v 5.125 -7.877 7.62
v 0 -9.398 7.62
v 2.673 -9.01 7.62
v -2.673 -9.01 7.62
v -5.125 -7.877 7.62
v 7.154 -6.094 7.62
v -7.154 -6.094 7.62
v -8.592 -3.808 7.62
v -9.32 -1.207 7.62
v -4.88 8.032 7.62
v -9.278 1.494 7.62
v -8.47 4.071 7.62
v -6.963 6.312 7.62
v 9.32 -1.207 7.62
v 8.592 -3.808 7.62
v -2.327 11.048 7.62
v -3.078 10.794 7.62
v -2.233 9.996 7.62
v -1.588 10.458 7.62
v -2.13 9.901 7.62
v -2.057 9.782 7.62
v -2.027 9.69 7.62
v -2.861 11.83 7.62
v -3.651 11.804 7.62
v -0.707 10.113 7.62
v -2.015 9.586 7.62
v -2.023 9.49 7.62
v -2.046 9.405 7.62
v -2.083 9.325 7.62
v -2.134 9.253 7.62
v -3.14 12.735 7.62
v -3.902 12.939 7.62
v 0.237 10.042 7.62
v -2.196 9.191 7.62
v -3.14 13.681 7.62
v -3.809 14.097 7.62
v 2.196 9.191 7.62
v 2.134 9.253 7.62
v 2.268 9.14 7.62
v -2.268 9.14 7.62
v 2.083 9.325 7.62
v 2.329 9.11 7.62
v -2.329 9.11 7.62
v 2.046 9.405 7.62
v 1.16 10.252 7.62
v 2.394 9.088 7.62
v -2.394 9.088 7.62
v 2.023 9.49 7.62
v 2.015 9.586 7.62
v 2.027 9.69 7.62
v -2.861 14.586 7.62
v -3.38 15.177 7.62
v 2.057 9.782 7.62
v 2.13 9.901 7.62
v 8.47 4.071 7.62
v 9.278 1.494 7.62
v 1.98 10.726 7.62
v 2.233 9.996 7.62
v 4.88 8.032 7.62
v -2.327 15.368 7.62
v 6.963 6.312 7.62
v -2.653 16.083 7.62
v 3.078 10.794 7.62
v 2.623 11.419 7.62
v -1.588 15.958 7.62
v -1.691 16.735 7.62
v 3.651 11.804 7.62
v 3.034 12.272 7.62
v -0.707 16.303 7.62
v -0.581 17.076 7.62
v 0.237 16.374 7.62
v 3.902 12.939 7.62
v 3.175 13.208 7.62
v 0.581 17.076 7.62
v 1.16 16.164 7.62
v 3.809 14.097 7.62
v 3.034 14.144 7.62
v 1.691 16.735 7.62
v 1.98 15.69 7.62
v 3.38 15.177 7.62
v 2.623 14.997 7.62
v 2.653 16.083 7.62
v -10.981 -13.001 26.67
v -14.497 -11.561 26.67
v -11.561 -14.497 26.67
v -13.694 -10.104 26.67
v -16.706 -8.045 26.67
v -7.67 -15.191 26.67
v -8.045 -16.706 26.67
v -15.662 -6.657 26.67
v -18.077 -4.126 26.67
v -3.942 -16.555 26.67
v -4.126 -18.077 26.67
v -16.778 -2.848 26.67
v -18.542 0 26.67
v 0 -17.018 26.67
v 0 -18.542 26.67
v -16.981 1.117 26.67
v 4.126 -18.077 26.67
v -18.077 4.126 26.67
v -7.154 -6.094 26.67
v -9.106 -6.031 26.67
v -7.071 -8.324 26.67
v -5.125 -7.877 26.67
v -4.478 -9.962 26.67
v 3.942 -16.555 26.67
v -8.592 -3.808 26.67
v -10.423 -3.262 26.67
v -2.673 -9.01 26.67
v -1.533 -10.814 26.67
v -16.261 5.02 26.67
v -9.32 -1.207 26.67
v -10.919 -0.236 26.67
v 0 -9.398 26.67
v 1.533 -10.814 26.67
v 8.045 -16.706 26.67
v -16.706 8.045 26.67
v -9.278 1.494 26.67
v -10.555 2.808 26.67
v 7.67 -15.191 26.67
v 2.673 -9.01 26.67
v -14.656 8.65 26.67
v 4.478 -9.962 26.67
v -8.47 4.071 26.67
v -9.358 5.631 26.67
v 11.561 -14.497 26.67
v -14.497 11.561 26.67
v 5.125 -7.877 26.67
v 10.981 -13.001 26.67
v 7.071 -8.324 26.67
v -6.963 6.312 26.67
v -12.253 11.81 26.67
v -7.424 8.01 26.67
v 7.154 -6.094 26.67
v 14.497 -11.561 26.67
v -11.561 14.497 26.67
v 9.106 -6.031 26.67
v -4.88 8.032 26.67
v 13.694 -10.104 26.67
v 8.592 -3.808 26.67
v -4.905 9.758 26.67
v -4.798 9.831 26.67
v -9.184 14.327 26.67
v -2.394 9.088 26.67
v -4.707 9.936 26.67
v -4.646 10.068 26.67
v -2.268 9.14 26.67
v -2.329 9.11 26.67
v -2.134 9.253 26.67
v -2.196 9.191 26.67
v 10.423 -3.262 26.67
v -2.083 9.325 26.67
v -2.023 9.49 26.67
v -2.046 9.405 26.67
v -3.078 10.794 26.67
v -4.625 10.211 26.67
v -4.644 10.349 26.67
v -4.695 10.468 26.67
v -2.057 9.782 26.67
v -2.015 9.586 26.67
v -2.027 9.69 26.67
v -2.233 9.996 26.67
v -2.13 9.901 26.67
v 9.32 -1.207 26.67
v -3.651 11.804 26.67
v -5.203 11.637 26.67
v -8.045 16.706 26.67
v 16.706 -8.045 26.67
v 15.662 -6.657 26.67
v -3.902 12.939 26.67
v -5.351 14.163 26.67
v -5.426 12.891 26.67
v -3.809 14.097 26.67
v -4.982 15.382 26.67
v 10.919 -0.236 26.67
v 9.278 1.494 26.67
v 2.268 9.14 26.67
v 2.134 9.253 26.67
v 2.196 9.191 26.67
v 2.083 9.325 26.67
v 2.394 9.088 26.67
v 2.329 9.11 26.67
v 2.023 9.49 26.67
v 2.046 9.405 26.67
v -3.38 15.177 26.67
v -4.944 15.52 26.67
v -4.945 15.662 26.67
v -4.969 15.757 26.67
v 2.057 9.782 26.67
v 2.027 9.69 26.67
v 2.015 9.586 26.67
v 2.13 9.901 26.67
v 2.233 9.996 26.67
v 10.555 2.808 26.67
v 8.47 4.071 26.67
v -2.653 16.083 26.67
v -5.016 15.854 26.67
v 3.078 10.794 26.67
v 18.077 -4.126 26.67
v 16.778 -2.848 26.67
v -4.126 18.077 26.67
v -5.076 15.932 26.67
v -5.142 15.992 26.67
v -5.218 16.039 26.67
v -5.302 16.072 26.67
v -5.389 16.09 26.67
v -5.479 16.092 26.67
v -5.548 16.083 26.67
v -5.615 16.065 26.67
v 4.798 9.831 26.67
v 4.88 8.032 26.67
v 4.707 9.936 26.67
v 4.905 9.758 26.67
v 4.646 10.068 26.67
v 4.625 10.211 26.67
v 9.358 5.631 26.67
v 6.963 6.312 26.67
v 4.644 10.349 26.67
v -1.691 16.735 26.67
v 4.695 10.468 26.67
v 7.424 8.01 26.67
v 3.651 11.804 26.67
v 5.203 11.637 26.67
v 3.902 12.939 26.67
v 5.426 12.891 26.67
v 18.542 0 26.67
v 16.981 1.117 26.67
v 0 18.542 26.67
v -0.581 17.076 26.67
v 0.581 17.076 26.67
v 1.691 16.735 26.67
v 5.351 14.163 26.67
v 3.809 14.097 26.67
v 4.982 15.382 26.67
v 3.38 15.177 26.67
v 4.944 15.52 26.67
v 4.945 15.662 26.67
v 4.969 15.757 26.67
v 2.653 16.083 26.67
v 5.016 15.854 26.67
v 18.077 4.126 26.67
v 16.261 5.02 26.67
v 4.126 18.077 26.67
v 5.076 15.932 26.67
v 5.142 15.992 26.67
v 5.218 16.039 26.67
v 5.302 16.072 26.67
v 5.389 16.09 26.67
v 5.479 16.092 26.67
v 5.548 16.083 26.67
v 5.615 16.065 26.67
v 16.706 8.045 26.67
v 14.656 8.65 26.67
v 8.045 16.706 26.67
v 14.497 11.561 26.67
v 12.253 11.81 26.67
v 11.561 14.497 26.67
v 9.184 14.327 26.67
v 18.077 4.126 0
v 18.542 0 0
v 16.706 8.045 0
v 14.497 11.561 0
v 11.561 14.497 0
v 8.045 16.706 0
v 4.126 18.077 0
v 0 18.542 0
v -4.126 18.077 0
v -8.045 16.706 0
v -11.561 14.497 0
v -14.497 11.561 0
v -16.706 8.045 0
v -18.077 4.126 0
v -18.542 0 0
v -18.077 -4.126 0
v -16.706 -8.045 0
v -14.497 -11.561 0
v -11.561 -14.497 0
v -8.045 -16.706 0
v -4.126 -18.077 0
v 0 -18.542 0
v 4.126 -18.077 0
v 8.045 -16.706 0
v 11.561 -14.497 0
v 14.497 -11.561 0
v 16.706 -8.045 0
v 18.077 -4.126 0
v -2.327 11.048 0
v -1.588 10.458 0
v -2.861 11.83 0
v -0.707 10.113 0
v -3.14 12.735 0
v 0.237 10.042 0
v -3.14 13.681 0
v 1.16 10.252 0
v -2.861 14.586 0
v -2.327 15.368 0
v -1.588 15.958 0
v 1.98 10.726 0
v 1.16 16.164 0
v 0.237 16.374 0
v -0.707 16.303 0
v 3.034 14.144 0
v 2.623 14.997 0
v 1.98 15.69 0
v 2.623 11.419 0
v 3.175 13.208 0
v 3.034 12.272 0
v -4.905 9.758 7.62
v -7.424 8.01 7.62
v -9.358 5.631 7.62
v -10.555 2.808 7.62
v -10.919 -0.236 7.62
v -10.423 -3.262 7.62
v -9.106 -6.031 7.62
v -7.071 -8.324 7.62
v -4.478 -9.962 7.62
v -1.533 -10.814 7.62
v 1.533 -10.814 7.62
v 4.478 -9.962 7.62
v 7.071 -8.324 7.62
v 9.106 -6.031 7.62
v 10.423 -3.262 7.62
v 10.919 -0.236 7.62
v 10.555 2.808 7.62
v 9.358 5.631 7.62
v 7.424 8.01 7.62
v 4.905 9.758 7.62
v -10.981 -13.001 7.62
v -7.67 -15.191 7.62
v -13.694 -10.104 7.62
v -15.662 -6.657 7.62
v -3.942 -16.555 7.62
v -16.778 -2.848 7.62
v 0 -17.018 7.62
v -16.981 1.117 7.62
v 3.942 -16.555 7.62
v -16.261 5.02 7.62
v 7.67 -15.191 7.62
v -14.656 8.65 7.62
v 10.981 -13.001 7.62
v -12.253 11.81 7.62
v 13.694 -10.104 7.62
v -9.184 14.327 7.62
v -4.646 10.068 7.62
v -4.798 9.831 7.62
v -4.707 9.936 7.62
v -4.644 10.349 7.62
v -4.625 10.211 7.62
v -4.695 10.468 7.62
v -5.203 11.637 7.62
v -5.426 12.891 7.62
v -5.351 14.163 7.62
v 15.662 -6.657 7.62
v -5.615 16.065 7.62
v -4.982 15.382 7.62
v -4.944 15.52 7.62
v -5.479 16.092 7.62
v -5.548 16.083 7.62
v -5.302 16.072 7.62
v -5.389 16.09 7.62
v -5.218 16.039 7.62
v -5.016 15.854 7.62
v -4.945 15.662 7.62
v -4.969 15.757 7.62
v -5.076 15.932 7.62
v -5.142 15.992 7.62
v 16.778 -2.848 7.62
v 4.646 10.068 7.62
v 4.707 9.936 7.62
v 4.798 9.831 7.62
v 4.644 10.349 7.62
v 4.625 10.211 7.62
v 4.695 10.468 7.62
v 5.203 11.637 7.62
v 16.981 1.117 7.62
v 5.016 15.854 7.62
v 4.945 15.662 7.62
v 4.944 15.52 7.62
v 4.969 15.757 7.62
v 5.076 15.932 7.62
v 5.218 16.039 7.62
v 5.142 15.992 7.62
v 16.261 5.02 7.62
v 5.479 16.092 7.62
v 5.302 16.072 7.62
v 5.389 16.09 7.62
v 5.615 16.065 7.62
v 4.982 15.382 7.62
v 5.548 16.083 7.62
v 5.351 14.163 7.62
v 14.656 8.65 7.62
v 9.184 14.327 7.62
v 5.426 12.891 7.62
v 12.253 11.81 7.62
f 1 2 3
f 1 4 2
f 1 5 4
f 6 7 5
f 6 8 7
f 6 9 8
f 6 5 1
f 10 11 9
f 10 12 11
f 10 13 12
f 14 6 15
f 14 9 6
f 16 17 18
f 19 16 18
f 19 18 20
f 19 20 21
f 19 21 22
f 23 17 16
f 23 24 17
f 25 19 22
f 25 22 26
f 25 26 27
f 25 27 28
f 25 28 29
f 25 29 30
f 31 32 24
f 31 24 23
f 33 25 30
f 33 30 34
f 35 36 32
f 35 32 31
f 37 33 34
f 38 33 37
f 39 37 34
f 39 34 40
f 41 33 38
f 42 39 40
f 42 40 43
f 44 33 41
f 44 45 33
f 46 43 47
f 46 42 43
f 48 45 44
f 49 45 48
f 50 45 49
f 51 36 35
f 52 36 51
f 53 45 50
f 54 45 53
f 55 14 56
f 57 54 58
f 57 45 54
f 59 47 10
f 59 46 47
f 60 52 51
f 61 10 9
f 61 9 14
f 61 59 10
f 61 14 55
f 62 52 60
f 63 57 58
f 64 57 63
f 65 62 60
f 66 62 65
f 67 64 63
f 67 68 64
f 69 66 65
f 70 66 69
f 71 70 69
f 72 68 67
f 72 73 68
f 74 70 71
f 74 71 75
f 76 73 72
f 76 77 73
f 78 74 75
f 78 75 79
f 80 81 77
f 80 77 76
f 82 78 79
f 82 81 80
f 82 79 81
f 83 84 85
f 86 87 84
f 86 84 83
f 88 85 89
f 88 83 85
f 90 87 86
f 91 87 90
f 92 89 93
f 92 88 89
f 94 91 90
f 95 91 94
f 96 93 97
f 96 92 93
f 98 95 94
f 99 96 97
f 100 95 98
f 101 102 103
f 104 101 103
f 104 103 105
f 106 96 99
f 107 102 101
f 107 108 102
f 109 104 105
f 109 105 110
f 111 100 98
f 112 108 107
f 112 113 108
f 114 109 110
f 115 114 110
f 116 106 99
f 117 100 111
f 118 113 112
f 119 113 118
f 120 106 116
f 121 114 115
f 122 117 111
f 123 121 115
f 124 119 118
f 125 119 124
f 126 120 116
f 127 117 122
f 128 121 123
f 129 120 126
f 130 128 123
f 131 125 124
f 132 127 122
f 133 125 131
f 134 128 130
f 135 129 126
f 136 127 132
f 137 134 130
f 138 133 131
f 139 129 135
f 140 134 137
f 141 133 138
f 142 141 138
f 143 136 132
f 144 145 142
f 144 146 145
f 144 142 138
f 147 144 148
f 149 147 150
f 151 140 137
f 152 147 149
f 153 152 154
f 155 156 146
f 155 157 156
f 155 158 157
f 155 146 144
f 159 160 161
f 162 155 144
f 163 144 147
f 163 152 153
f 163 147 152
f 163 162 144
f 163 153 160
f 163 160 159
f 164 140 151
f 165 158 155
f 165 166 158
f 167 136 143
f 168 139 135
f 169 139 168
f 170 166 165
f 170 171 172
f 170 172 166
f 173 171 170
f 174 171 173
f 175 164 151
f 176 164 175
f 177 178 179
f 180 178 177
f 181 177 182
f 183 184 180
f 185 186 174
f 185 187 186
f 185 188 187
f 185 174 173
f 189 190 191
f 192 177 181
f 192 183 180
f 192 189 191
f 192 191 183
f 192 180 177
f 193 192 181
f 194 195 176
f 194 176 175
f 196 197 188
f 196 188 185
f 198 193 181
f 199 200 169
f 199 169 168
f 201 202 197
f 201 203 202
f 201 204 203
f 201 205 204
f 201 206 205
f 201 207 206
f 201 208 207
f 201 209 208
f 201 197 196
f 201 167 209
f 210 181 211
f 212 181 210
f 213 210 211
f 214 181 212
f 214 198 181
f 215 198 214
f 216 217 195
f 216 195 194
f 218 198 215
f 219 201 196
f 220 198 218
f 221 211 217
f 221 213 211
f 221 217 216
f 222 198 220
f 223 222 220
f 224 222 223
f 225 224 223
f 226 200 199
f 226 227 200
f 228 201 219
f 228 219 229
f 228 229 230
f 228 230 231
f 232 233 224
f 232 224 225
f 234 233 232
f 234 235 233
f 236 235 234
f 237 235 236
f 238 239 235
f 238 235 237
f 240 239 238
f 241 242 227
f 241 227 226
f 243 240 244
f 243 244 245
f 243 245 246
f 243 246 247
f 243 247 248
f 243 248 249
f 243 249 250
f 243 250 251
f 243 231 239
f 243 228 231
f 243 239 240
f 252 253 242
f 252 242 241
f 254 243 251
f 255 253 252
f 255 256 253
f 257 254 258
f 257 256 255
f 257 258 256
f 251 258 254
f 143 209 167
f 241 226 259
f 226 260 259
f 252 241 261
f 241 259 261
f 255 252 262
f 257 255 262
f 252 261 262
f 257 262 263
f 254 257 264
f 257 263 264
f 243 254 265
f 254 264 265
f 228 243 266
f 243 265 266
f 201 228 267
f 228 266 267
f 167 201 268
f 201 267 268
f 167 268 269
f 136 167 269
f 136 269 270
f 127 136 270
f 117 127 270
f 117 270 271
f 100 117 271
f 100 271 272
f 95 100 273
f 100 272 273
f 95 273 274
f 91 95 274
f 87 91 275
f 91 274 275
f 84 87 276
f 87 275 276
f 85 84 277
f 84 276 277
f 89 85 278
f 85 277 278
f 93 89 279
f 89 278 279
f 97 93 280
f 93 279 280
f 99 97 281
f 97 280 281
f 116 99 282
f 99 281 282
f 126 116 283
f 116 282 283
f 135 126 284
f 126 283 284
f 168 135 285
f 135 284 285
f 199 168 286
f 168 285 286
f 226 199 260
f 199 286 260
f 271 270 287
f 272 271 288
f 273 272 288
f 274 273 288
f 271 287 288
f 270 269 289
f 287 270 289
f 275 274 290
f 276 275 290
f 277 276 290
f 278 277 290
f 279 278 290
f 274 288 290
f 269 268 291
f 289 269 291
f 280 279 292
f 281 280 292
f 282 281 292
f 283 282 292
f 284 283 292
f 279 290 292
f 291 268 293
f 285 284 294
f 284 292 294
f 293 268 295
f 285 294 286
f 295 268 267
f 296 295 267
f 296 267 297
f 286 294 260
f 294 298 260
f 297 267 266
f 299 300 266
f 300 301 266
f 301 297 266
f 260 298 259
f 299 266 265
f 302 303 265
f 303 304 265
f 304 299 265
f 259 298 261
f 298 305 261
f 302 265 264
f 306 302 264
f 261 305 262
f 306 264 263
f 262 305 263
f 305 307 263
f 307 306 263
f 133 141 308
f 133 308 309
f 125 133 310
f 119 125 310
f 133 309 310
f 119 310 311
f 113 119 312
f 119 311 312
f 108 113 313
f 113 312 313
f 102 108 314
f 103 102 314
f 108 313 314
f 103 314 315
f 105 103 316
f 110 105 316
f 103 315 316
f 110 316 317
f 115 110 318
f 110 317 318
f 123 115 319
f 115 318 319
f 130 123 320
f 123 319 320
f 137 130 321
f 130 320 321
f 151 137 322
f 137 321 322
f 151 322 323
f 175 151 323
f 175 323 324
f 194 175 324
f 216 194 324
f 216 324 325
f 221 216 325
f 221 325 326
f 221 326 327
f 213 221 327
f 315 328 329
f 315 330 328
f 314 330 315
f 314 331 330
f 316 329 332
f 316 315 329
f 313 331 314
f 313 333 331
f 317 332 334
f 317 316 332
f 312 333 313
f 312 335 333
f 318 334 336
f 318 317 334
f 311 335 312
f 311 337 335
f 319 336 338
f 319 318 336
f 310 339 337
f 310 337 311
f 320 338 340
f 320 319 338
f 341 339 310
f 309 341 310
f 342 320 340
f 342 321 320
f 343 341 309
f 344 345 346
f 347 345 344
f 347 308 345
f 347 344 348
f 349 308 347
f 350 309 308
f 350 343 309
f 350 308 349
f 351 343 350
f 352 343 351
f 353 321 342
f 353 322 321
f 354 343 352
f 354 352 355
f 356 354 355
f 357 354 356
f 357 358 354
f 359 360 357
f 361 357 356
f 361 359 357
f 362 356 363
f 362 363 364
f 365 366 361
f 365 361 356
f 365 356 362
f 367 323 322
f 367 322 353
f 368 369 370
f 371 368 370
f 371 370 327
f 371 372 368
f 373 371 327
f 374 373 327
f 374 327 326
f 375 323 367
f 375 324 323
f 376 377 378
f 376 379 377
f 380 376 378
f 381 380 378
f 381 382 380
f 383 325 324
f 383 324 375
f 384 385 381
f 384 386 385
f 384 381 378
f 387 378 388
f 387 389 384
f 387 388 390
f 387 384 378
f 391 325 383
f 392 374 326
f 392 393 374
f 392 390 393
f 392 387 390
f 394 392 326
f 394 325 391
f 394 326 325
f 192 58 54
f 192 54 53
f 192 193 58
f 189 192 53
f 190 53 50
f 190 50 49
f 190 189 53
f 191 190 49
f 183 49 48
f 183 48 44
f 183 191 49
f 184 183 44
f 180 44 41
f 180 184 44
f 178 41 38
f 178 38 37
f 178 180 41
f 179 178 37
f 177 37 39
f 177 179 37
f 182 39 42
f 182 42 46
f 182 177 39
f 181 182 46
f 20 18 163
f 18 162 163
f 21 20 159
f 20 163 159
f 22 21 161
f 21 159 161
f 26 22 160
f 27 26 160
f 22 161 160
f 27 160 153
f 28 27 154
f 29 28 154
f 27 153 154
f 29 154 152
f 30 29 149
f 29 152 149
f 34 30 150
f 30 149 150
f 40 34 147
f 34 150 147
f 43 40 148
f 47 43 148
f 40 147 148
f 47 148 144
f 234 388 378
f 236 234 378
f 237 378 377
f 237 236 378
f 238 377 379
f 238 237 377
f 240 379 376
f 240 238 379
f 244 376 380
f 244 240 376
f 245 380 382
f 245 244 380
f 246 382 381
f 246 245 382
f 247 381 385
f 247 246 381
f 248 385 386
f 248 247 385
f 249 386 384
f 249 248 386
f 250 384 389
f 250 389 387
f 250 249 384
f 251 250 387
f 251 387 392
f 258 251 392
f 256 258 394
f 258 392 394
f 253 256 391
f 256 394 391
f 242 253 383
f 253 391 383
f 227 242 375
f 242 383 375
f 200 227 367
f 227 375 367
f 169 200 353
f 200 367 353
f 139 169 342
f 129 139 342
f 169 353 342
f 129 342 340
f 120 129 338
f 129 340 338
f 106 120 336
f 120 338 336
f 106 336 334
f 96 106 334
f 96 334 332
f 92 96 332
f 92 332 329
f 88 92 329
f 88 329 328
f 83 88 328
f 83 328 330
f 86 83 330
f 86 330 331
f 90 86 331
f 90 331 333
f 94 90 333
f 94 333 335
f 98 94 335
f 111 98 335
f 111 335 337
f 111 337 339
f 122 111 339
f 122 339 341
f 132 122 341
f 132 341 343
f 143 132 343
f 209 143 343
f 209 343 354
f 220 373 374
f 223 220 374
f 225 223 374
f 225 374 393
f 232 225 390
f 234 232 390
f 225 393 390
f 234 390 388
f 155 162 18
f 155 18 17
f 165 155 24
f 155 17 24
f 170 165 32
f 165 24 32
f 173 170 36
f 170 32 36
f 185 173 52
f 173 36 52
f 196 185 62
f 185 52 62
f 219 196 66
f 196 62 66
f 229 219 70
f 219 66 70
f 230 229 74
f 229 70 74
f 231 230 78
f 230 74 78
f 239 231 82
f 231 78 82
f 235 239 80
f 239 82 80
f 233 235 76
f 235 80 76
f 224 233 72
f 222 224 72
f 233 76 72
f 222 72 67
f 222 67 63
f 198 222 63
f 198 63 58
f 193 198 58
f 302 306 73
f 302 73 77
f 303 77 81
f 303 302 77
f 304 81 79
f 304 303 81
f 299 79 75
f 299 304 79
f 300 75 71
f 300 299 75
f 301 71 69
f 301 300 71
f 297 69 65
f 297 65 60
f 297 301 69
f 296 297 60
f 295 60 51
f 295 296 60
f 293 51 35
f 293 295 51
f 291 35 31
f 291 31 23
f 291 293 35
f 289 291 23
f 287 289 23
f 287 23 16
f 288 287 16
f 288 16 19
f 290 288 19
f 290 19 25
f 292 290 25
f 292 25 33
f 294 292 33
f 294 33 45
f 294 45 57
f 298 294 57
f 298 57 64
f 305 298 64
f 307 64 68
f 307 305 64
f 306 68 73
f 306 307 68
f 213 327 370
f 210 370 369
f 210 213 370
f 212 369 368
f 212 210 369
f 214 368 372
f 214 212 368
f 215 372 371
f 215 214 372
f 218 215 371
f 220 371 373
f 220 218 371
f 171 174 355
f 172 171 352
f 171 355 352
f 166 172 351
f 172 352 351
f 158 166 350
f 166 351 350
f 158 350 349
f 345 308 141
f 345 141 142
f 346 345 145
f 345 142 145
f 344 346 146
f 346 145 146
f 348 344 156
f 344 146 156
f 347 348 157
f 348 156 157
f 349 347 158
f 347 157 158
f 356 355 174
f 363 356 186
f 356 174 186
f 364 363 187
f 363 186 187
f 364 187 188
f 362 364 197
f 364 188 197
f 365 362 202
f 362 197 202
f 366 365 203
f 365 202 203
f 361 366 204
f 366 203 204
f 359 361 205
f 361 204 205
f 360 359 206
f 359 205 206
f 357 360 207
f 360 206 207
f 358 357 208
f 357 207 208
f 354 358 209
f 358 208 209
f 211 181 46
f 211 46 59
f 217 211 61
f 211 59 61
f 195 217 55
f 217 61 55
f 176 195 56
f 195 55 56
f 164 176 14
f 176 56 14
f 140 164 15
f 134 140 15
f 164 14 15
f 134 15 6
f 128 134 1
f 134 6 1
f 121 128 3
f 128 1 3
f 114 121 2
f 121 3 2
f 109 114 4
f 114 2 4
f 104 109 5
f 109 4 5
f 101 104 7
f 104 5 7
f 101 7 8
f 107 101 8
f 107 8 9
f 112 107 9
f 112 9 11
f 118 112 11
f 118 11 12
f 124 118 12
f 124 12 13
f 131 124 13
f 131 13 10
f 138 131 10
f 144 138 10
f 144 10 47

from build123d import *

# Parameters (mm, degrees)
F0_R     = 18.542
F0_R_2   = 3.175
F1_DEPTH = 7.62
F2_R     = 18.542
F3_DEPTH = 19.05
F4_R     = 0.508


with BuildPart() as f1:
    # F0 (on Top) → F1 (new body)
    with BuildSketch(Plane.XY):
        Circle(F0_R)
        with Locations((0, 13.208)):
            Circle(F0_R_2, mode=Mode.SUBTRACT)
    extrude(amount=F1_DEPTH)

    # F2 (on face) → F3 (join)
    with BuildSketch(Plane.XY.offset(7.62)):
        Circle(F2_R)
        with BuildLine():
            ThreePointArc((-4.3636460762, 16.44904), (-5.435558049, 13.2293554581), (-4.3889780516, 10.0013476923))
            ThreePointArc((-4.3889780516, 10.0013476923), (0, -10.922), (4.3889780516, 10.0013476923))
            ThreePointArc((4.3889780516, 10.0013476923), (5.435558049, 13.2293554581), (4.3636460762, 16.44904))
            ThreePointArc((4.3636460762, 16.44904), (0, -17.018), (-4.3636460762, 16.44904))
        make_face(mode=Mode.SUBTRACT)
        with BuildLine():
            ThreePointArc((-0.7465455676, 9.3683015385), (0, 17.1196), (0.7465455676, 9.3683015385))
            ThreePointArc((0.7465455676, 9.3683015385), (0, -9.398), (-0.7465455676, 9.3683015385))
        make_face(mode=Mode.SUBTRACT)
    extrude(amount=F3_DEPTH)

    # F4
    f4_edges = [f1.edges().sort_by_distance(p)[0] for p in [
        (0.746546, 9.368302, 17.145),
        (4.388978, 10.001348, 17.145),
        (4.363646, 16.44904, 17.145),
        (-4.388978, 10.001348, 17.145),
        (-4.363646, 16.44904, 17.145),
        (-0.746546, 9.368302, 17.145),
    ]]
    fillet(f4_edges, radius=F4_R)


solid = f1.part
